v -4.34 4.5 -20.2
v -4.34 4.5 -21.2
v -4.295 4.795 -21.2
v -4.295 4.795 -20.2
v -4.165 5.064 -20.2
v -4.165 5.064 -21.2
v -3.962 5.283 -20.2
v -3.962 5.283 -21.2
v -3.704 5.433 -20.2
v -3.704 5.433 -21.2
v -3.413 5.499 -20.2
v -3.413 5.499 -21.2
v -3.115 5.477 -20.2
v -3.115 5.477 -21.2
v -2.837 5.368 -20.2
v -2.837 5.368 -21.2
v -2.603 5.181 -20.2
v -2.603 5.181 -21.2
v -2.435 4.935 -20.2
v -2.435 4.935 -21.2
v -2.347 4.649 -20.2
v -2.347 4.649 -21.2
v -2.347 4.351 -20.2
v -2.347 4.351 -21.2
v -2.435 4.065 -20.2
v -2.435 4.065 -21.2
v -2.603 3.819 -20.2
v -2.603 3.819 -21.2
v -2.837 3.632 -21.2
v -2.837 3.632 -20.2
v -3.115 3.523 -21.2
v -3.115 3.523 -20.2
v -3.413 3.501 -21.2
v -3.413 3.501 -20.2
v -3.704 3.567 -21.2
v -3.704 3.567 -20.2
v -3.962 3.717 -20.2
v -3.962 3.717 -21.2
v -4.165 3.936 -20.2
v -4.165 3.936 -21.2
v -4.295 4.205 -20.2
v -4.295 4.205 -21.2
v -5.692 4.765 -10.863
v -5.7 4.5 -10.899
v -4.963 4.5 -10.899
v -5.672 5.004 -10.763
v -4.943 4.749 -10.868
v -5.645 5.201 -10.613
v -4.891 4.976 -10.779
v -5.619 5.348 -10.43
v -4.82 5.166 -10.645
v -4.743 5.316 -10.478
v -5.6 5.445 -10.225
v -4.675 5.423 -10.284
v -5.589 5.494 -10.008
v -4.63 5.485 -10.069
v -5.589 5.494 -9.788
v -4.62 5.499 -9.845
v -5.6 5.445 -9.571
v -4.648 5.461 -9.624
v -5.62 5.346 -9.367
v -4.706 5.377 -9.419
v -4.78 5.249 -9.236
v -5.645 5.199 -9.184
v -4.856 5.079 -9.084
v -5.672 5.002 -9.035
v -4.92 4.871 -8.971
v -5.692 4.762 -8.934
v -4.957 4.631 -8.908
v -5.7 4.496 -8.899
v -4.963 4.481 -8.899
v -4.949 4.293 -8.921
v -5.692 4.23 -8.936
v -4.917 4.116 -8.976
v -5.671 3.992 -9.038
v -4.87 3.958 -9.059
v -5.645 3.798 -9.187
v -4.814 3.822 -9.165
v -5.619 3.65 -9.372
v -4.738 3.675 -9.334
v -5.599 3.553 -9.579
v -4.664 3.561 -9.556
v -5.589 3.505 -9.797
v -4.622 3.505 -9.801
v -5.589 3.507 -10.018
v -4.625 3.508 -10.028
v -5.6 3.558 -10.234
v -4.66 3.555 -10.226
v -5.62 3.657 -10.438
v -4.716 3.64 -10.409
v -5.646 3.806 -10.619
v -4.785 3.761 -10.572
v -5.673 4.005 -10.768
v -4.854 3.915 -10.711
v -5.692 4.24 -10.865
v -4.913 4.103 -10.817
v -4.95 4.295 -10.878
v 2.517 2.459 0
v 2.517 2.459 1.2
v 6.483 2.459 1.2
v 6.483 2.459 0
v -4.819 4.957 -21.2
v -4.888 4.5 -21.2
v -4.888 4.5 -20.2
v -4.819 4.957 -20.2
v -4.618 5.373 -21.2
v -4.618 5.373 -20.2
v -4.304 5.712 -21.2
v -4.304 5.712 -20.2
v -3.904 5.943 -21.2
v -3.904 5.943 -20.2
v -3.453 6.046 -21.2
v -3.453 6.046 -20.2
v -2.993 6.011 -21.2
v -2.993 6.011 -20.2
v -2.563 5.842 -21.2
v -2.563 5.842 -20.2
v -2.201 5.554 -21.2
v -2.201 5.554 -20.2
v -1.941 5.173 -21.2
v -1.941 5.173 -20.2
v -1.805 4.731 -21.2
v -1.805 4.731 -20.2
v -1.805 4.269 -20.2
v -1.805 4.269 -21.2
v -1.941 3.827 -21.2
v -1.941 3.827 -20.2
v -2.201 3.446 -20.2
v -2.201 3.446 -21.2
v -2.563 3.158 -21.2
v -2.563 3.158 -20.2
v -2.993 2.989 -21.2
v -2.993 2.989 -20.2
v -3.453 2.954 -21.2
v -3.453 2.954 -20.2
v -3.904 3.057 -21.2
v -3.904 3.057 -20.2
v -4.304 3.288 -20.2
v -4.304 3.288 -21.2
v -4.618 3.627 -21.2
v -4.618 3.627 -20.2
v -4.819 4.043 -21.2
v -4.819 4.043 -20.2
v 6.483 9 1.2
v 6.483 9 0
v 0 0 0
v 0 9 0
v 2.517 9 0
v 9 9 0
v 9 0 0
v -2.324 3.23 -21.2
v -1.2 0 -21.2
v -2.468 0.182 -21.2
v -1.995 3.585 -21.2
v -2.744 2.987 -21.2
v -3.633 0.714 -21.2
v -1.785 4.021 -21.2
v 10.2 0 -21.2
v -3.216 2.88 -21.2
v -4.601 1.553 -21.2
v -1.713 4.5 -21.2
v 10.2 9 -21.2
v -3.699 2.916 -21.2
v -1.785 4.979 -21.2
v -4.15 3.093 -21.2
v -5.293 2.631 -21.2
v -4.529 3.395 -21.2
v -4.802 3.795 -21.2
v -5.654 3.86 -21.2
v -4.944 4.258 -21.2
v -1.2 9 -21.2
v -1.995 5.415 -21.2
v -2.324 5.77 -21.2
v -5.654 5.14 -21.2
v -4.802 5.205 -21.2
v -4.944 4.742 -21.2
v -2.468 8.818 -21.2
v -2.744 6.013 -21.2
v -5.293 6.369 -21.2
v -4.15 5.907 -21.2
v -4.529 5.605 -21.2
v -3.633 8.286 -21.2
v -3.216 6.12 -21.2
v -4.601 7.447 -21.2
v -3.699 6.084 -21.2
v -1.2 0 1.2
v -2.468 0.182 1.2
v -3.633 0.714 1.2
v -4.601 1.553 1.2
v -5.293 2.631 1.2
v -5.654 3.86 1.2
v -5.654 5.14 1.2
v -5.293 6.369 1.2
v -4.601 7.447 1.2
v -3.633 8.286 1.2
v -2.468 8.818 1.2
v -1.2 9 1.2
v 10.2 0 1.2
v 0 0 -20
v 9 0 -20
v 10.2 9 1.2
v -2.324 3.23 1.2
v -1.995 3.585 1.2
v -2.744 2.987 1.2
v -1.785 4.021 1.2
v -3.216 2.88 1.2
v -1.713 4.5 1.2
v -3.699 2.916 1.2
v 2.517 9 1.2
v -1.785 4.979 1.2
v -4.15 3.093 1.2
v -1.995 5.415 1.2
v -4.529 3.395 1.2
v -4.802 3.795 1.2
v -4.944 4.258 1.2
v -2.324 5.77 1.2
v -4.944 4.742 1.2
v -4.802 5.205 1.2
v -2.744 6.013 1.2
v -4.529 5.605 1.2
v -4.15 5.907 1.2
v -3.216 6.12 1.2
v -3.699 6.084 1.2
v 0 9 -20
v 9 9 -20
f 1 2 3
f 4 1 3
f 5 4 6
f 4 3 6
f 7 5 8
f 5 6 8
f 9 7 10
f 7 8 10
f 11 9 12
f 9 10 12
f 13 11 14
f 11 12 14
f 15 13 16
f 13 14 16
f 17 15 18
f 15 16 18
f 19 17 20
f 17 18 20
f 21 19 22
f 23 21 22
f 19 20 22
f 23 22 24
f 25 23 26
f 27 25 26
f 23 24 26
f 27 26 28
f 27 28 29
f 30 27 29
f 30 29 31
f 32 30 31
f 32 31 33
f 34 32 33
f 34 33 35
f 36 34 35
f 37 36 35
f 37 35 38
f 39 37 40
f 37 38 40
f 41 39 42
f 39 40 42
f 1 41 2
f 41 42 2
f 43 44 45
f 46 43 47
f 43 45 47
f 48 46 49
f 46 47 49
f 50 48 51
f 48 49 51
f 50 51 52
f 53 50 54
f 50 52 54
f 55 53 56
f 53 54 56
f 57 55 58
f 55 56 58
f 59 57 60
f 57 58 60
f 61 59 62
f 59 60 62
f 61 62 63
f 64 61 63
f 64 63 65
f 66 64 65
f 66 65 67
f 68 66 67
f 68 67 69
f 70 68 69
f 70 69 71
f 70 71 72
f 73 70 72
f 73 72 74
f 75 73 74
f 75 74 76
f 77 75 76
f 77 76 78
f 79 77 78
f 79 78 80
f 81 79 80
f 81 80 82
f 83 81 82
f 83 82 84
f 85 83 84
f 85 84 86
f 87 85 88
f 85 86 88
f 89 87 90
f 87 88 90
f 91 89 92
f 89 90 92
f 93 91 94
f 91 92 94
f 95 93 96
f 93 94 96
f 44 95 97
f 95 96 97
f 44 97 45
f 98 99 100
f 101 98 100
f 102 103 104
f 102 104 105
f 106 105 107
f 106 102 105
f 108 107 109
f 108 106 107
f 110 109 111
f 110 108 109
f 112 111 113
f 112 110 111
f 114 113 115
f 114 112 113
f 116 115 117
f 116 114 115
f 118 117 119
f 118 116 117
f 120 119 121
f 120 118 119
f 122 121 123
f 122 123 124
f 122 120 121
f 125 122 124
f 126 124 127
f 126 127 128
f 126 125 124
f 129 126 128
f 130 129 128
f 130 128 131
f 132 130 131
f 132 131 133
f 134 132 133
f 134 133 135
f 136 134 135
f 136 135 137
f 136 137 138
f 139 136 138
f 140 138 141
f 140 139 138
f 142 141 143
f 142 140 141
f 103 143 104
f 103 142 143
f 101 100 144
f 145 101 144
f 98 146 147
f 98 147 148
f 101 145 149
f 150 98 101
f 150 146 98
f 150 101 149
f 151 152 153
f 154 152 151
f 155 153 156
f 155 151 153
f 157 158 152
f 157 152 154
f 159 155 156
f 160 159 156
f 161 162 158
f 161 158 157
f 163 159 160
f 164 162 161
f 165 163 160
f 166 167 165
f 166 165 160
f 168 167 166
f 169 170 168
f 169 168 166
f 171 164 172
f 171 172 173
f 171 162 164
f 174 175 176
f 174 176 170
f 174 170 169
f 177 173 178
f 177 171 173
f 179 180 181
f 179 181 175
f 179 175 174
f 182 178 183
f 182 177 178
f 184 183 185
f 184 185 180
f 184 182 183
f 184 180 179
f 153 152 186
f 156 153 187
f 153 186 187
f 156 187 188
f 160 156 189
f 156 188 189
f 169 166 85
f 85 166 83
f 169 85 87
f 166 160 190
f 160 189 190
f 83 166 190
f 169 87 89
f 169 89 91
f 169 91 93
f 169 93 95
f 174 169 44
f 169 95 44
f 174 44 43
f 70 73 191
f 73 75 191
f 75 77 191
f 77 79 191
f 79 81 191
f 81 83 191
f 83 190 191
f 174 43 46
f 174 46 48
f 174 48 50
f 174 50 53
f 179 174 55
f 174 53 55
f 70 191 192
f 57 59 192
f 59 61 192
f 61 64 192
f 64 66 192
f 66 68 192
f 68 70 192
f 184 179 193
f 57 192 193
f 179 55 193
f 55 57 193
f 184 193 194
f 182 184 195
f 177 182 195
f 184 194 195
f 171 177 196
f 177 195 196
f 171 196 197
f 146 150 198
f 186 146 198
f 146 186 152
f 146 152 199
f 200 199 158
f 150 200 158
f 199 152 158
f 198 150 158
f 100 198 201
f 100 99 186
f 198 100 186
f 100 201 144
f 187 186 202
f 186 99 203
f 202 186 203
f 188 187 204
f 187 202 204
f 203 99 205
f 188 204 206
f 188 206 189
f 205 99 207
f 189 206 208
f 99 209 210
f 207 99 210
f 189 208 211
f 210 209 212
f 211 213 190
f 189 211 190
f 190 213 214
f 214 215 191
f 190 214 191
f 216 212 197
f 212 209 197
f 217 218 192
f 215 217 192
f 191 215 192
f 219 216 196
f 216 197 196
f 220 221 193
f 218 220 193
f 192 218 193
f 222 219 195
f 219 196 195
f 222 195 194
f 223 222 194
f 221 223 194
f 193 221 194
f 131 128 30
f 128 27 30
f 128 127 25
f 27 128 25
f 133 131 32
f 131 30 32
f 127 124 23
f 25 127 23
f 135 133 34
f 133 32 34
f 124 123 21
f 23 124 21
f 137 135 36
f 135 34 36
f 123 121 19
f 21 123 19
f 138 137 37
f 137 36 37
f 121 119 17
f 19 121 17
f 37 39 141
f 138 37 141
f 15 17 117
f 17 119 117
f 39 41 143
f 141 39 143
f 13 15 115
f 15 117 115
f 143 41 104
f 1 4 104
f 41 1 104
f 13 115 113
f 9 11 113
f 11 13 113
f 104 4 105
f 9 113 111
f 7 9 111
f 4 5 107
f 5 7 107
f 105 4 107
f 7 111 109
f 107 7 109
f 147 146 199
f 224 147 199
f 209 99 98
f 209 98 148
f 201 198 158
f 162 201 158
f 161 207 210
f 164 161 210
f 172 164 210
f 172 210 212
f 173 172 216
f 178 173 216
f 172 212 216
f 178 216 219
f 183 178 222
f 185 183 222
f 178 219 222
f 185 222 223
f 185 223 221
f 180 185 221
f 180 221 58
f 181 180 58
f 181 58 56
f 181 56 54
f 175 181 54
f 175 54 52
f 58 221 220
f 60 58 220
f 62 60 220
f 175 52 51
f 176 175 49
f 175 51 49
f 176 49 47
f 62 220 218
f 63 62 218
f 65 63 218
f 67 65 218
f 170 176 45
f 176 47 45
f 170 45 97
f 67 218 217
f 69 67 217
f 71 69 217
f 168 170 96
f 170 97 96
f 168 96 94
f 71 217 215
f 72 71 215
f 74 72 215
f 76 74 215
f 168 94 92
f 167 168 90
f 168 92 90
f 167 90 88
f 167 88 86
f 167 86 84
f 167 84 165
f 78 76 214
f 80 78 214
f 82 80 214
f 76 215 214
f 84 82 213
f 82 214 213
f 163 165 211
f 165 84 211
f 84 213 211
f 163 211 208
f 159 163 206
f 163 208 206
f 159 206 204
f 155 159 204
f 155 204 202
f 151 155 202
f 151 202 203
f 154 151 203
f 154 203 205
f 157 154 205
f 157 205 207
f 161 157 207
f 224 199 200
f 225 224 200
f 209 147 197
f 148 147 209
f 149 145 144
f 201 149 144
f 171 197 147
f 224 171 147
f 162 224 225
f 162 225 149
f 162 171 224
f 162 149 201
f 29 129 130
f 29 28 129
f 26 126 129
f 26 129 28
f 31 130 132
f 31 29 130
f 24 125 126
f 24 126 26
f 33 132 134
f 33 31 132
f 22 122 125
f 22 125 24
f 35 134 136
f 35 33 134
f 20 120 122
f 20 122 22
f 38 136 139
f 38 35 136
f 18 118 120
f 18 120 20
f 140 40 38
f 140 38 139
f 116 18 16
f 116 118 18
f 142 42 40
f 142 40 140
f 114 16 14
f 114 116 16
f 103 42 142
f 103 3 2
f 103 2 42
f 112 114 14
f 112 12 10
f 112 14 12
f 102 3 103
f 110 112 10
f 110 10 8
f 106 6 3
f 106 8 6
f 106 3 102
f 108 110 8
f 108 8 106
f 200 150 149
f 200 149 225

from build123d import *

# Parameters (mm, degrees)
SKETCH1_W           = 11.4
SKETCH1_H           = 22.4
SKETCH1_W_2         = 9
SKETCH1_H_2         = 20
BOSS_EXTRUDE1_DEPTH = 9
CUT_EXTRUDE1_REACH  = 24.4
SKETCH2_W           = 3.96584196
SKETCH2_H           = 6.540682608
SKETCH3_R           = 1.625
BOSS_EXTRUDE2_DEPTH = 22.4
CUT_EXTRUDE2_START  = -4
SKETCH4_R           = 1
CUT_EXTRUDE2_DEPTH  = 10
SKETCH5_R           = 1.55
SKETCH5_R_2         = 1.001932819
BOSS_EXTRUDE3_DEPTH = 1


with BuildPart() as part:
    # Sketch1 → Boss-Extrude1 (new body)
    with BuildSketch(Plane(origin=(0, 0, 0), x_dir=(1, 0, 0), z_dir=(0, 1, 0))):
        with Locations((4.5, 10)):
            Rectangle(SKETCH1_W, SKETCH1_H)
        with Locations((4.5, 10)):
            Rectangle(SKETCH1_W_2, SKETCH1_H_2, mode=Mode.SUBTRACT)
    extrude(amount=BOSS_EXTRUDE1_DEPTH)

    # Sketch2 → Cut-Extrude1 (cut, up to next)
    with BuildSketch(Plane.XY.offset(1.2), mode=Mode.PRIVATE) as cut_extrude1_sk1:
        with Locations((4.5, 5.729658696)):
            Rectangle(SKETCH2_W, SKETCH2_H)
    cut_extrude1_tool1 = extrude(cut_extrude1_sk1.sketch, amount=-CUT_EXTRUDE1_REACH, mode=Mode.PRIVATE) & part.part
    add(cut_extrude1_tool1.solids().sort_by_distance((4.5, 5.729659, 1.2))[0], mode=Mode.SUBTRACT)

    # Sketch3 → Boss-Extrude2 (add)
    with BuildSketch(Plane.XY.offset(1.2)):
        with BuildLine():
            Line((-1.2, 9), (-1.2, 0))
            ThreePointArc((-1.2, 0), (-5.7, 4.5), (-1.2, 9))
        make_face()
        with Locations((-3.337644254, 4.5)):
            Circle(SKETCH3_R, mode=Mode.SUBTRACT)
    extrude(amount=-BOSS_EXTRUDE2_DEPTH)

    # Sketch4 → Cut-Extrude2 (cut)
    with BuildSketch(Plane(origin=(0, 0, 0), x_dir=(0, 0, -1), z_dir=(1, 0, 0)).offset(CUT_EXTRUDE2_START)):
        with Locations((9.899176572, 4.5)):
            Circle(SKETCH4_R)
    extrude(amount=-CUT_EXTRUDE2_DEPTH, mode=Mode.SUBTRACT)


with BuildPart() as body_2:
    # Sketch5 → Boss-Extrude3 (new body)
    with BuildSketch(Plane(origin=(0, 0, -21.2), x_dir=(-1, 0, 0), z_dir=(0, 0, -1))):
        with Locations((3.337644254, 4.5)):
            Circle(SKETCH5_R)
        with Locations((3.337644254, 4.5)):
            Circle(SKETCH5_R_2, mode=Mode.SUBTRACT)
    extrude(amount=-BOSS_EXTRUDE3_DEPTH)


solid = Compound([part.part, body_2.part])
